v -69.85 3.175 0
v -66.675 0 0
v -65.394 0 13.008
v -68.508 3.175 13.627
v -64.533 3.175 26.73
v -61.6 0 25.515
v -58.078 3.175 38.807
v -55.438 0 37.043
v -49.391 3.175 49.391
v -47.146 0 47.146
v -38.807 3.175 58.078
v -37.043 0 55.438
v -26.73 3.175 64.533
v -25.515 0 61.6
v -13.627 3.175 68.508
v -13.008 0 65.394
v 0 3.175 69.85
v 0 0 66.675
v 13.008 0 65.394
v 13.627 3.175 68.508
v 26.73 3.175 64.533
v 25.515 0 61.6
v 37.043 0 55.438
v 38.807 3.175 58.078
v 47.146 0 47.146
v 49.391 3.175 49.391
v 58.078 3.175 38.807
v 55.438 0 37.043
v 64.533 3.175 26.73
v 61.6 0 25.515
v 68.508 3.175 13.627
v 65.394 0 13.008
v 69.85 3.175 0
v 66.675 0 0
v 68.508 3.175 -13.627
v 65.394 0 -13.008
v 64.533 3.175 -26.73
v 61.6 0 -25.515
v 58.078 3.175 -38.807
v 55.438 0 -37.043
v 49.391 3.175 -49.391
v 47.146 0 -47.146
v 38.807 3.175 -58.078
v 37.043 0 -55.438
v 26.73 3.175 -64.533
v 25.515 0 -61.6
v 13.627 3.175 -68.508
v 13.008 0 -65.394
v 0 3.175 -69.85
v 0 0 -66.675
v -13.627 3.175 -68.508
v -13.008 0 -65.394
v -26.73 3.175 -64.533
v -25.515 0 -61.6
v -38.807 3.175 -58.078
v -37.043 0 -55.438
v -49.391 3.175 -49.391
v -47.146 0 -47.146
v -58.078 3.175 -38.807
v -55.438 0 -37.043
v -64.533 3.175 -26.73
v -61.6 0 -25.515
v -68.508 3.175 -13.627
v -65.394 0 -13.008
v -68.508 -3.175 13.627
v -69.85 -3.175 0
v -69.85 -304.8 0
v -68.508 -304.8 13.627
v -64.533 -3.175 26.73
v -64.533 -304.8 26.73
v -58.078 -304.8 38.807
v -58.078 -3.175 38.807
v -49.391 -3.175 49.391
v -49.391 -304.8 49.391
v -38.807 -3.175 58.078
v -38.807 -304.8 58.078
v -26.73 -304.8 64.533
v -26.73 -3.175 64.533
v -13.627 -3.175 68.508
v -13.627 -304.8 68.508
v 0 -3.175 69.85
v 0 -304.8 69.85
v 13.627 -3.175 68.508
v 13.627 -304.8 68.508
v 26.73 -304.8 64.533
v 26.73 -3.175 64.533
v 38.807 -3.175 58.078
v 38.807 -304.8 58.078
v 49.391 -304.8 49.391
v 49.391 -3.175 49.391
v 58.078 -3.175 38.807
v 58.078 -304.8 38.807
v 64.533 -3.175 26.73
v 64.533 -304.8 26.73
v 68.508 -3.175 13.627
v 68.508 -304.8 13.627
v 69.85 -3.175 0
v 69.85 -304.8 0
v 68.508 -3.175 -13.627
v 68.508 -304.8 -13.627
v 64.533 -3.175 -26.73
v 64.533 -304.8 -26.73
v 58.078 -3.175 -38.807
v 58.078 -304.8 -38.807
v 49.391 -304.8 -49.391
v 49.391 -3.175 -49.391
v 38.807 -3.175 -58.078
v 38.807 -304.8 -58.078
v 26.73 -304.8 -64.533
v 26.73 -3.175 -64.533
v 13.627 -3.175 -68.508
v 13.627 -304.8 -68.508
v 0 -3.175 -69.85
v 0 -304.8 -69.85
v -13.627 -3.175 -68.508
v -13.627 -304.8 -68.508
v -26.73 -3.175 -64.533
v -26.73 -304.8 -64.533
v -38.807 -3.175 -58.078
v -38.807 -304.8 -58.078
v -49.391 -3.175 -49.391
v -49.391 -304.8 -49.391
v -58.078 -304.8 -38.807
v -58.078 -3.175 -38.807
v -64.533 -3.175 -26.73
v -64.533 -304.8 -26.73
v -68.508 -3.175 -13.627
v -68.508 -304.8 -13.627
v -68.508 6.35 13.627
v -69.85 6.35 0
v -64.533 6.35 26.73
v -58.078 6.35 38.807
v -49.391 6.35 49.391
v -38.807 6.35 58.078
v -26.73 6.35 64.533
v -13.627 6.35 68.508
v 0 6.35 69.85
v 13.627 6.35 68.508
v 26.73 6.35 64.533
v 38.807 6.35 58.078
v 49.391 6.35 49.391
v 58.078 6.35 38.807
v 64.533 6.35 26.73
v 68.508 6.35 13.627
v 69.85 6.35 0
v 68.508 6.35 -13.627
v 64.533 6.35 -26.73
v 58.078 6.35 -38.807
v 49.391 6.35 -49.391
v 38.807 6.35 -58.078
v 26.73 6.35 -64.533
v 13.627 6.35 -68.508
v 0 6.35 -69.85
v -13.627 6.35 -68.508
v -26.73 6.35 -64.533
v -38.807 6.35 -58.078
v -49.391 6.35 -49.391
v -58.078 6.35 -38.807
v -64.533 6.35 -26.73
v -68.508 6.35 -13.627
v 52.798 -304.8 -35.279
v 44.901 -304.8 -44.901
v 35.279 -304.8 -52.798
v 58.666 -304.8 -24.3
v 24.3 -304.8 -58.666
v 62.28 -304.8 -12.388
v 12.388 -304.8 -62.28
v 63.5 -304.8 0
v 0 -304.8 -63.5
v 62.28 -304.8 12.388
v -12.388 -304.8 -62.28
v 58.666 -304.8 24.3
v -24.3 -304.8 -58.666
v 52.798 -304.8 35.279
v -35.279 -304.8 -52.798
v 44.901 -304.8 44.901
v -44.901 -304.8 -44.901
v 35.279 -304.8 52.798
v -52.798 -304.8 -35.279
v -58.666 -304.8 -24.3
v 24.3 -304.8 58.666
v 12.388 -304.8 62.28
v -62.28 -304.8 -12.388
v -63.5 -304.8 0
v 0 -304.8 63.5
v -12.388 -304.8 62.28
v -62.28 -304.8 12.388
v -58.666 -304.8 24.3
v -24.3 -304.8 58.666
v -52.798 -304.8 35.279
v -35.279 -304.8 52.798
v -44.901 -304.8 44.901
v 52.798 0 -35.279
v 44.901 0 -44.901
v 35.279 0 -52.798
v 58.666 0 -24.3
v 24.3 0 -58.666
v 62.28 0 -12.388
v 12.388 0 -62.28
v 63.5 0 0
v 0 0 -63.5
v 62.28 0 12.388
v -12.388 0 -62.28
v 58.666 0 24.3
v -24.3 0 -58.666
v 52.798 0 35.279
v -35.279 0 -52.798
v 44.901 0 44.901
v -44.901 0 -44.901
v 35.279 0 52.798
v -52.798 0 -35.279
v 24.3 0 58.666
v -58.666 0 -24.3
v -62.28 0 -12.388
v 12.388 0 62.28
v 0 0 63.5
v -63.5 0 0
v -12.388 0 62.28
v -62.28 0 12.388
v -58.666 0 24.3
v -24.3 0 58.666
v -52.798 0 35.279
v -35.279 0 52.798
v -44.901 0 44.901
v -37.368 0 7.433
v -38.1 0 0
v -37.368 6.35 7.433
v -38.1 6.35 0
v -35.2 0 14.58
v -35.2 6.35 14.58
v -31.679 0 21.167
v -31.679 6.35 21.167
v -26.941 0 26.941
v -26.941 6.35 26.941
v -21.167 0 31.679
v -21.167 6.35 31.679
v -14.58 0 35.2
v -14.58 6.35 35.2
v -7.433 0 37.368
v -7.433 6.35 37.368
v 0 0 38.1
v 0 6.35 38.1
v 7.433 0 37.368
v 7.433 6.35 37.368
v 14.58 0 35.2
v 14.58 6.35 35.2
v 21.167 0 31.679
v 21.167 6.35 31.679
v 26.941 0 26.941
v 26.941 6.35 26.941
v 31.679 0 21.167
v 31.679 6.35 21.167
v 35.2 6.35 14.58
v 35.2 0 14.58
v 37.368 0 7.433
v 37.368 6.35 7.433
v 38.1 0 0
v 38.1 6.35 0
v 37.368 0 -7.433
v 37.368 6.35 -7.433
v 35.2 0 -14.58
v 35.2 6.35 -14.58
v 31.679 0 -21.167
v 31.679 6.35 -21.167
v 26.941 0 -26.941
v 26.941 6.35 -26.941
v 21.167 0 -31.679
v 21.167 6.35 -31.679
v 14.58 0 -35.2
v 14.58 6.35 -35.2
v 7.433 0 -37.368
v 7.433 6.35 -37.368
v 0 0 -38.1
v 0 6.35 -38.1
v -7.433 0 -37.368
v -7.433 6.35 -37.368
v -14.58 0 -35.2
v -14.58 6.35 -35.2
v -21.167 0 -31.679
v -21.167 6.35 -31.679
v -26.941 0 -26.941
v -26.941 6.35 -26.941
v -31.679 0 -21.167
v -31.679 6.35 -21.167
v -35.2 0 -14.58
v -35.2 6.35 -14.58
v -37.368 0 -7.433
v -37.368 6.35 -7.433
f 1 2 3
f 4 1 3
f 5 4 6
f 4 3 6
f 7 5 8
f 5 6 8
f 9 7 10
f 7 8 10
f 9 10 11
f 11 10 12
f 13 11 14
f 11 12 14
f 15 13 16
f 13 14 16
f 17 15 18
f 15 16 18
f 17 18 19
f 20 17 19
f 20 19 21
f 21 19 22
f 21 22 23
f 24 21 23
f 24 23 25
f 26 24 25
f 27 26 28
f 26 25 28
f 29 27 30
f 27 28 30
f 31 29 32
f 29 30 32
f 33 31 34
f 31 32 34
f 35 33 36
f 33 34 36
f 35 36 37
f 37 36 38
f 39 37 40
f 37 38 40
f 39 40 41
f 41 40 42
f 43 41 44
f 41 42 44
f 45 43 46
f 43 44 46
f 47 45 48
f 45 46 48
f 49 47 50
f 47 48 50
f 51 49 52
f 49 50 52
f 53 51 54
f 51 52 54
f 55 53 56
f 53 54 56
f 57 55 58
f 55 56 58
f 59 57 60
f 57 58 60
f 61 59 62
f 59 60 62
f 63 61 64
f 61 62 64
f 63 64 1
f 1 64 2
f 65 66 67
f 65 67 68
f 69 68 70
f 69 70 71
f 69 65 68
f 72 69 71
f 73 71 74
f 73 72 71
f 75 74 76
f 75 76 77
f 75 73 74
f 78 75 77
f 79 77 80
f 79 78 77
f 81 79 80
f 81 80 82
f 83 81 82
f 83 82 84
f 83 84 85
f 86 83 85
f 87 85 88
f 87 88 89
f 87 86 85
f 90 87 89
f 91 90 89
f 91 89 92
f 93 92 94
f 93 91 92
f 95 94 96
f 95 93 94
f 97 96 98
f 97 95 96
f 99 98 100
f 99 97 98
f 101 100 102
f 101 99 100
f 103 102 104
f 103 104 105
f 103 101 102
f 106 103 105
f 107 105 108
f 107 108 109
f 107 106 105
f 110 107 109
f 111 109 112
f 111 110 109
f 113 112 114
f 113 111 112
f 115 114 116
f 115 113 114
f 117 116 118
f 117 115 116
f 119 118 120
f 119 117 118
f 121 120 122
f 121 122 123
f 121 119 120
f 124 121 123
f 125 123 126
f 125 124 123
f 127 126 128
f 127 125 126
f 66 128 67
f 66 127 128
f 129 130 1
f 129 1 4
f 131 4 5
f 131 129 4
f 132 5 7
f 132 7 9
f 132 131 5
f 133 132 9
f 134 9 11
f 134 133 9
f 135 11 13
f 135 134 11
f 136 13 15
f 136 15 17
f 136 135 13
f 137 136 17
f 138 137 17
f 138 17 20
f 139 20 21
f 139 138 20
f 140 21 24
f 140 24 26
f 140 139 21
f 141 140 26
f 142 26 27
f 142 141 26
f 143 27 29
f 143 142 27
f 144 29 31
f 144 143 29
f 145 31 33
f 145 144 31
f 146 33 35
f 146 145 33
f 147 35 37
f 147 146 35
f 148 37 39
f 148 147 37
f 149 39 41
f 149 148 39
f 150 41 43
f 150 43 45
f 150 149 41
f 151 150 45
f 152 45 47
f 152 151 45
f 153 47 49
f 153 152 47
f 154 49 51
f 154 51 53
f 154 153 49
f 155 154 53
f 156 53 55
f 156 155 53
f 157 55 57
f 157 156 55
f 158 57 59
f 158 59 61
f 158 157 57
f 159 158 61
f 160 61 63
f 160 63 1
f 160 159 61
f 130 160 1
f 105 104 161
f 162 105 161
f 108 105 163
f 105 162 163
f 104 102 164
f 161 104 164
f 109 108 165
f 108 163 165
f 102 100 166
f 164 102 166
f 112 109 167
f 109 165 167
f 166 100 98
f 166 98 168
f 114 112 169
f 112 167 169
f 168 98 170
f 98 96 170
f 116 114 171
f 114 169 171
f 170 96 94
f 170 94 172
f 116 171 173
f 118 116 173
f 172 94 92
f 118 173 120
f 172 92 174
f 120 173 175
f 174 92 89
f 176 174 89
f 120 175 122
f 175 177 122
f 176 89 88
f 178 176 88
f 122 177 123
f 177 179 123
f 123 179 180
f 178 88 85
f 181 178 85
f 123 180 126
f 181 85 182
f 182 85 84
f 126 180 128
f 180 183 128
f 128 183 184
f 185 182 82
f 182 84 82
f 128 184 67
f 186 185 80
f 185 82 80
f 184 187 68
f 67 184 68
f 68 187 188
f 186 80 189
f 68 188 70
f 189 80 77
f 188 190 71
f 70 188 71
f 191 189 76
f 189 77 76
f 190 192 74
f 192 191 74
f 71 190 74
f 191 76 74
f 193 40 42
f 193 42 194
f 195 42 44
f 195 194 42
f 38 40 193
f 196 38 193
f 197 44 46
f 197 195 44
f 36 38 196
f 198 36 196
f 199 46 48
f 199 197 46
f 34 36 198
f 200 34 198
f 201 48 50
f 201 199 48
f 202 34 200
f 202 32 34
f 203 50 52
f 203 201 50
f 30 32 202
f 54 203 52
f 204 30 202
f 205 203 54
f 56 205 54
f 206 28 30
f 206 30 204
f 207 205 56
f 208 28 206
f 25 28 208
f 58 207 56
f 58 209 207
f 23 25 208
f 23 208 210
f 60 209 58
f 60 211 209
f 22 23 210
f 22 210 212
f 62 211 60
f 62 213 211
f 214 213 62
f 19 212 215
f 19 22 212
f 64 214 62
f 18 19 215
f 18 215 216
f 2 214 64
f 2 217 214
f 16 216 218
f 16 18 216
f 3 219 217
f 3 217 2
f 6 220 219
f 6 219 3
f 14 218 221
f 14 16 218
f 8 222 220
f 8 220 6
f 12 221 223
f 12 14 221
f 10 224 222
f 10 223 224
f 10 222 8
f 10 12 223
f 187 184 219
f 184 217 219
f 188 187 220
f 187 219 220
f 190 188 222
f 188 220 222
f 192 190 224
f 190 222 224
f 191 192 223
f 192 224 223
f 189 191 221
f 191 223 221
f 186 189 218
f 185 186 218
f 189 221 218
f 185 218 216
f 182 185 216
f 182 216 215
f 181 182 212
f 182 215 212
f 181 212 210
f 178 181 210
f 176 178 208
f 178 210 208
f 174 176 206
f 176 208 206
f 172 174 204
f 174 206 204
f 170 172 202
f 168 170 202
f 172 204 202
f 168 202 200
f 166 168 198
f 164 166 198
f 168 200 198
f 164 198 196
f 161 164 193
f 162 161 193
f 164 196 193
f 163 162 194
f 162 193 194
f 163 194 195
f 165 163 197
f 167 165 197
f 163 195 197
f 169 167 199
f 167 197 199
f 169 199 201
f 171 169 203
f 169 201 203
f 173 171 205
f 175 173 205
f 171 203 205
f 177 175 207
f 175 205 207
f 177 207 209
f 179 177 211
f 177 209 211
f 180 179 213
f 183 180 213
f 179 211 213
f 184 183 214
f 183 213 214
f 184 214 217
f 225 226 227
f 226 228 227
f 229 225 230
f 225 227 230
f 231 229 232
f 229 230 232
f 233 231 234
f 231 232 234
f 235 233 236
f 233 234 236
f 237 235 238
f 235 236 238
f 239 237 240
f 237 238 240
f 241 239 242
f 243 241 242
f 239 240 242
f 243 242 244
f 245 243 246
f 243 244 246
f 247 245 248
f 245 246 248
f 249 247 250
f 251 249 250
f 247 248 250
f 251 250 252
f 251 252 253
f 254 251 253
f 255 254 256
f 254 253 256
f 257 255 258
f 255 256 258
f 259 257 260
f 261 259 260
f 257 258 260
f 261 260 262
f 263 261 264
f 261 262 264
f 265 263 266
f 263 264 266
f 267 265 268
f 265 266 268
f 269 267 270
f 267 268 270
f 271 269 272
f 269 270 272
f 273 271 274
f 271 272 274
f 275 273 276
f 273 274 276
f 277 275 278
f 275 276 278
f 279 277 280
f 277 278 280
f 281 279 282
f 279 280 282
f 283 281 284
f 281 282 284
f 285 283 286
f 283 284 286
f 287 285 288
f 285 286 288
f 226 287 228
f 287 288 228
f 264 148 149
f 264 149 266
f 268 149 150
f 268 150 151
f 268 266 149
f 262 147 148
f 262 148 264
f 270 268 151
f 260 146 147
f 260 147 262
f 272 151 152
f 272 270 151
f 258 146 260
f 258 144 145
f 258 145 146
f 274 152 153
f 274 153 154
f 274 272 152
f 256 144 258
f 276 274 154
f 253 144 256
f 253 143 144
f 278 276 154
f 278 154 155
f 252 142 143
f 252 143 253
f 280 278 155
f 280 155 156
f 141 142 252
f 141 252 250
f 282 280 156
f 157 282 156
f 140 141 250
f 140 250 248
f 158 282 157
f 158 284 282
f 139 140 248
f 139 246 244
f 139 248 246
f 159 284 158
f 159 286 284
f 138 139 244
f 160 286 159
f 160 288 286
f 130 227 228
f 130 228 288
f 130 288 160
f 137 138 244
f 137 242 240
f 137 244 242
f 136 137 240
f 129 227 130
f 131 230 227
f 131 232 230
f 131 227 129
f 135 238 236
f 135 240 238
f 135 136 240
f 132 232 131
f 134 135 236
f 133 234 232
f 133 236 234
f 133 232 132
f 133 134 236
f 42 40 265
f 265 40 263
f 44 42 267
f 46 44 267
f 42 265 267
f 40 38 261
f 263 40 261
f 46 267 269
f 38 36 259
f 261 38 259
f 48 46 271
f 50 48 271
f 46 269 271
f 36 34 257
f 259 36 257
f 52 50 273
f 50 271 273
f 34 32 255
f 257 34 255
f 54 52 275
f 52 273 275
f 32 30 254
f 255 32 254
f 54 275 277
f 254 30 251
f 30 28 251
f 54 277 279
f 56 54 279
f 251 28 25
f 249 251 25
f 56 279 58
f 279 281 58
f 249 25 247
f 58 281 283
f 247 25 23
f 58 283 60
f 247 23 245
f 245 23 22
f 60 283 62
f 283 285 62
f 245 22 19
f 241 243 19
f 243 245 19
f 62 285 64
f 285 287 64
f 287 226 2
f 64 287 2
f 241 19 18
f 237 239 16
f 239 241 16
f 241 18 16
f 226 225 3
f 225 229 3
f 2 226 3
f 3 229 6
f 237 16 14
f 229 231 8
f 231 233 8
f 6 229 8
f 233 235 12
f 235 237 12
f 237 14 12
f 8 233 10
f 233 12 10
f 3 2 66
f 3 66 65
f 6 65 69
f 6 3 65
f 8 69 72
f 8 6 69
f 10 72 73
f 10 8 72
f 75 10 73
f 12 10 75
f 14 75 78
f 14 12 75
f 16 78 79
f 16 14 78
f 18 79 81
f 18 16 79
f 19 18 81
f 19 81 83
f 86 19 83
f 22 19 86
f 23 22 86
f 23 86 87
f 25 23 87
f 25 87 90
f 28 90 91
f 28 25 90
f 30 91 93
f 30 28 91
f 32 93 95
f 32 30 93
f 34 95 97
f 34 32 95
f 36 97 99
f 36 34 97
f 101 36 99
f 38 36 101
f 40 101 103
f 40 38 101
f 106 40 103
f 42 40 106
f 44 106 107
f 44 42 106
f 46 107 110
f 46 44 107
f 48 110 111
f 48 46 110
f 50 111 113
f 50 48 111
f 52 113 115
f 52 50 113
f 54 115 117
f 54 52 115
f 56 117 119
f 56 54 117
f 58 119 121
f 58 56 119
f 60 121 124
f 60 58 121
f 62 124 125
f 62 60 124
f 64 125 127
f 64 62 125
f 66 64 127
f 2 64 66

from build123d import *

# Parameters (mm, degrees)
SKETCH1_W     = 6.35
SKETCH1_H     = 304.8
SKETCH2_W     = 31.75
SKETCH2_H     = 6.35
CHAMFER1_SIZE = 3.175
CHAMFER2_SIZE = 3.175


with BuildPart() as part:
    # Sketch1 → Revolve1 (revolve)
    with BuildSketch(Plane.XY):
        with Locations((-66.675, -152.4)):
            Rectangle(SKETCH1_W, SKETCH1_H)
    revolve(axis=Axis((0, 0, 0), (0, 1, 0)))

    # Chamfer1
    chamfer1_edges = [part.edges().sort_by_distance(p)[0] for p in [
        (69.85, 0, 0),
    ]]
    chamfer(chamfer1_edges, length=CHAMFER1_SIZE)


with BuildPart() as body_2:
    # Sketch2 → Revolve2 (revolve)
    with BuildSketch(Plane.XY):
        with Locations((-53.975, 3.175)):
            Rectangle(SKETCH2_W, SKETCH2_H)
    revolve(axis=Axis((0, 0, 0), (0, 1, 0)))

    # Chamfer2
    chamfer2_edges = [body_2.edges().sort_by_distance(p)[0] for p in [
        (69.85, 0, 0),
    ]]
    chamfer(chamfer2_edges, length=CHAMFER2_SIZE)


solid = Compound([part.part, body_2.part])
